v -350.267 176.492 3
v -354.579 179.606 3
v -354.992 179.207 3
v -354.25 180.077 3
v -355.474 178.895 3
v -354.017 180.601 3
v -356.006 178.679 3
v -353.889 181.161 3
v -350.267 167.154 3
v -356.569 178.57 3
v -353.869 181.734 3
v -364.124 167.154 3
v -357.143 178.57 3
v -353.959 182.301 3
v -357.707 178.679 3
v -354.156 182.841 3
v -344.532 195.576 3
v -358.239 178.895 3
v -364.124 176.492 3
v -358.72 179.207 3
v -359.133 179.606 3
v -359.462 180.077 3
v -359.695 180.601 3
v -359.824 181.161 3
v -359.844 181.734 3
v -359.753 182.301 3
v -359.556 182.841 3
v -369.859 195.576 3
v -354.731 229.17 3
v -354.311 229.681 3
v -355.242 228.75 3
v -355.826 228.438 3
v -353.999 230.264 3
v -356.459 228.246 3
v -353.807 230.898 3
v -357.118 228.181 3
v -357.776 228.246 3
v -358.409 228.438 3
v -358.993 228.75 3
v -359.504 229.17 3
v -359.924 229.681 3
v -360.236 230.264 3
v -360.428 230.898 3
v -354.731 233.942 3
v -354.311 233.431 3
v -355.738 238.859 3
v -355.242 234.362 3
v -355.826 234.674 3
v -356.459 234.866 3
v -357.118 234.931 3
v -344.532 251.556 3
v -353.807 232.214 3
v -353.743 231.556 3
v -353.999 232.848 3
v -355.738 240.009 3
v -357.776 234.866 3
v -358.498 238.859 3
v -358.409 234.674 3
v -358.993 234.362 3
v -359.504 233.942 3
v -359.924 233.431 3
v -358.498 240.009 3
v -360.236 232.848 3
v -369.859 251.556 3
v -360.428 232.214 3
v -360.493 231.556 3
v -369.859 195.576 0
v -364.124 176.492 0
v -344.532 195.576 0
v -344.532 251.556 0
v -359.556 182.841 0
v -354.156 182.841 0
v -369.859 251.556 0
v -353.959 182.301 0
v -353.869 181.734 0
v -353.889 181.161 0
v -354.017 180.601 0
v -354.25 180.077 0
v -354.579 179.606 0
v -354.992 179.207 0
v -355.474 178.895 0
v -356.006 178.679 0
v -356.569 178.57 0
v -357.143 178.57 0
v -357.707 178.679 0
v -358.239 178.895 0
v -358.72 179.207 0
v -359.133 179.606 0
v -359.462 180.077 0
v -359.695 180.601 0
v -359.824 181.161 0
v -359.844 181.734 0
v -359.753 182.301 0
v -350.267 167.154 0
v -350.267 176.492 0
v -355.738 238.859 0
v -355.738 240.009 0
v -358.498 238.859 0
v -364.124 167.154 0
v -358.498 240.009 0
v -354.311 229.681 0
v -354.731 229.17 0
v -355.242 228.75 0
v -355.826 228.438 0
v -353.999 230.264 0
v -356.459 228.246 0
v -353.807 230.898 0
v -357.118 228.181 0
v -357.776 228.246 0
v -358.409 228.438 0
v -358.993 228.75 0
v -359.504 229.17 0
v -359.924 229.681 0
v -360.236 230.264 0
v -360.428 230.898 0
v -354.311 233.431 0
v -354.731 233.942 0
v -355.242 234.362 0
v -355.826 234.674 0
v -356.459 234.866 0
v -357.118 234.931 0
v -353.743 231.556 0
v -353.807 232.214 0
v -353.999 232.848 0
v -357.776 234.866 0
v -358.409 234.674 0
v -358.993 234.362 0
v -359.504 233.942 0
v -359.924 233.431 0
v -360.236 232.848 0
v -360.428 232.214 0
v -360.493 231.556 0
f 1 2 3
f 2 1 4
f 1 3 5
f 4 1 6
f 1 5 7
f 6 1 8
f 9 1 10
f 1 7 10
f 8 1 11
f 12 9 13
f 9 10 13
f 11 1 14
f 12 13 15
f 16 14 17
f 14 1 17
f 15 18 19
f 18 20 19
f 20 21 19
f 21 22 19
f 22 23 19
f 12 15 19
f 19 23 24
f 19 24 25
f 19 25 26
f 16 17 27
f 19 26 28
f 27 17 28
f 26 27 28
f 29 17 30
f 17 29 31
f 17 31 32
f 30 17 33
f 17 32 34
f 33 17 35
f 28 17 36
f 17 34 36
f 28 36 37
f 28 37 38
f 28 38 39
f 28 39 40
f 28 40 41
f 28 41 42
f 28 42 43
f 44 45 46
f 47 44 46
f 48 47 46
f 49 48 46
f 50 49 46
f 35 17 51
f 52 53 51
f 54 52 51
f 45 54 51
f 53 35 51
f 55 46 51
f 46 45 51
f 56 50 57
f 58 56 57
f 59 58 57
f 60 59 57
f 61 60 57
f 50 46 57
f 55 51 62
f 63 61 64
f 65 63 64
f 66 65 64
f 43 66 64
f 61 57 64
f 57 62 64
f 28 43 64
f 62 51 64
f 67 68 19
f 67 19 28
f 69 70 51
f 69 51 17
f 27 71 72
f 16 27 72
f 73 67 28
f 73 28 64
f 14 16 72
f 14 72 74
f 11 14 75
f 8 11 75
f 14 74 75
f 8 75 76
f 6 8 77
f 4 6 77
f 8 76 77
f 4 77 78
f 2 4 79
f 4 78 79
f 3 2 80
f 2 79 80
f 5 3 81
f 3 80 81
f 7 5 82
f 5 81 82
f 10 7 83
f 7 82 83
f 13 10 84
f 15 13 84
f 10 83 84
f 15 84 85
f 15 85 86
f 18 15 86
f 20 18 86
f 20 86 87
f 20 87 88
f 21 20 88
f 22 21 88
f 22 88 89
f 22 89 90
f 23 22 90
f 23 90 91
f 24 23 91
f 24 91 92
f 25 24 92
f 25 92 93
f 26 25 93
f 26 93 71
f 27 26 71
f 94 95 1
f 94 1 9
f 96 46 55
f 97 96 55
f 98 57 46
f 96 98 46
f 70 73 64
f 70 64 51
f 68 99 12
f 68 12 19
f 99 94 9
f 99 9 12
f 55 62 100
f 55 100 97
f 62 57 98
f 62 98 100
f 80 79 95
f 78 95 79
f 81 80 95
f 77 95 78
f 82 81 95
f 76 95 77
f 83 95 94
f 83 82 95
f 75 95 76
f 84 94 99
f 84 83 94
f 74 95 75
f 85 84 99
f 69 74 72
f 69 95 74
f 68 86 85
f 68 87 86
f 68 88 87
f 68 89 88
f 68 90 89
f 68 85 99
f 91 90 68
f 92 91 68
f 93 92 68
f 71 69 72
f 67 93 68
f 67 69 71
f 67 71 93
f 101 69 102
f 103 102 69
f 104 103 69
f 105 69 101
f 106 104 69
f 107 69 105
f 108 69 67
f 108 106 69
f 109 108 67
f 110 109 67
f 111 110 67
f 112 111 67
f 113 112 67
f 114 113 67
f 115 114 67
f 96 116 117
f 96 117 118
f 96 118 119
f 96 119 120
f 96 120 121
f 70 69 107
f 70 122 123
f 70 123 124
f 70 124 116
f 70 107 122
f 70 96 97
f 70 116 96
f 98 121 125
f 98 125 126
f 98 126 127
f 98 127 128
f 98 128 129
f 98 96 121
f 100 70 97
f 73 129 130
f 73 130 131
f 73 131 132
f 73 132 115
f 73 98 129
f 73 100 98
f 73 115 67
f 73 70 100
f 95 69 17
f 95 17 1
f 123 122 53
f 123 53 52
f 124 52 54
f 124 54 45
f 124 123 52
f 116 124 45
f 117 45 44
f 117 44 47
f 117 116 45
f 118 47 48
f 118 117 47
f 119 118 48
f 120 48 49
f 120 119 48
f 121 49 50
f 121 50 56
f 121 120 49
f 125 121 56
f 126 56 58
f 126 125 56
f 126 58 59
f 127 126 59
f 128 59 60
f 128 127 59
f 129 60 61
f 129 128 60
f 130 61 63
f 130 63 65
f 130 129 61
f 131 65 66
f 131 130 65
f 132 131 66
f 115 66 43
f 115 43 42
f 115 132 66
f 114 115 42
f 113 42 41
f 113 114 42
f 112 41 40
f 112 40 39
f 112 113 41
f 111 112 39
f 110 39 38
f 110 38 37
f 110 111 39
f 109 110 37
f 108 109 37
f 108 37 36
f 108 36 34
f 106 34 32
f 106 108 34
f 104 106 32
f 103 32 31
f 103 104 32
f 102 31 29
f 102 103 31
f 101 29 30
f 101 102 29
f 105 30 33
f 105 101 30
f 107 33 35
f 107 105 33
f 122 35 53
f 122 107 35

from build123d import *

# Parameters (mm, degrees)
SKETCH1_R           = 3.375
BOSS_EXTRUDE3_DEPTH = 3
SKETCH5_W           = 2.76
SKETCH5_H           = 1.15
CUT_EXTRUDE3_DEPTH  = 448.473185448


with BuildPart() as part:
    # Sketch1 → Boss-Extrude3 (new body)
    with BuildSketch(Plane.XY):
        Polygon((-364.123724325, 176.492478394), (-369.858869661, 195.576225703), (-369.858869661, 251.55599422), (-344.532032114, 251.55599422), (-344.532032114, 195.576225703), (-350.26717745, 176.492478394), (-350.26717745, 167.153932289), (-364.123724325, 167.153932289), align=None)
        with Locations((-357.117541936, 231.55599422)):
            Circle(SKETCH1_R, mode=Mode.SUBTRACT)
    extrude(amount=BOSS_EXTRUDE3_DEPTH)

    # Sketch5 → Cut-Extrude3 (cut, through all)
    with BuildSketch(Plane.XY.offset(-9.5)):
        with BuildLine():
            Line((-359.5563, 182.840556402), (-354.1563, 182.840556402))
            ThreePointArc((-354.1563, 182.840556402), (-356.8563, 178.555993811), (-359.5563, 182.840556402))
        make_face()
        with Locations((-357.117541936, 239.434089807)):
            Rectangle(SKETCH5_W, SKETCH5_H)
    extrude(amount=CUT_EXTRUDE3_DEPTH, mode=Mode.SUBTRACT)


solid = part.part
